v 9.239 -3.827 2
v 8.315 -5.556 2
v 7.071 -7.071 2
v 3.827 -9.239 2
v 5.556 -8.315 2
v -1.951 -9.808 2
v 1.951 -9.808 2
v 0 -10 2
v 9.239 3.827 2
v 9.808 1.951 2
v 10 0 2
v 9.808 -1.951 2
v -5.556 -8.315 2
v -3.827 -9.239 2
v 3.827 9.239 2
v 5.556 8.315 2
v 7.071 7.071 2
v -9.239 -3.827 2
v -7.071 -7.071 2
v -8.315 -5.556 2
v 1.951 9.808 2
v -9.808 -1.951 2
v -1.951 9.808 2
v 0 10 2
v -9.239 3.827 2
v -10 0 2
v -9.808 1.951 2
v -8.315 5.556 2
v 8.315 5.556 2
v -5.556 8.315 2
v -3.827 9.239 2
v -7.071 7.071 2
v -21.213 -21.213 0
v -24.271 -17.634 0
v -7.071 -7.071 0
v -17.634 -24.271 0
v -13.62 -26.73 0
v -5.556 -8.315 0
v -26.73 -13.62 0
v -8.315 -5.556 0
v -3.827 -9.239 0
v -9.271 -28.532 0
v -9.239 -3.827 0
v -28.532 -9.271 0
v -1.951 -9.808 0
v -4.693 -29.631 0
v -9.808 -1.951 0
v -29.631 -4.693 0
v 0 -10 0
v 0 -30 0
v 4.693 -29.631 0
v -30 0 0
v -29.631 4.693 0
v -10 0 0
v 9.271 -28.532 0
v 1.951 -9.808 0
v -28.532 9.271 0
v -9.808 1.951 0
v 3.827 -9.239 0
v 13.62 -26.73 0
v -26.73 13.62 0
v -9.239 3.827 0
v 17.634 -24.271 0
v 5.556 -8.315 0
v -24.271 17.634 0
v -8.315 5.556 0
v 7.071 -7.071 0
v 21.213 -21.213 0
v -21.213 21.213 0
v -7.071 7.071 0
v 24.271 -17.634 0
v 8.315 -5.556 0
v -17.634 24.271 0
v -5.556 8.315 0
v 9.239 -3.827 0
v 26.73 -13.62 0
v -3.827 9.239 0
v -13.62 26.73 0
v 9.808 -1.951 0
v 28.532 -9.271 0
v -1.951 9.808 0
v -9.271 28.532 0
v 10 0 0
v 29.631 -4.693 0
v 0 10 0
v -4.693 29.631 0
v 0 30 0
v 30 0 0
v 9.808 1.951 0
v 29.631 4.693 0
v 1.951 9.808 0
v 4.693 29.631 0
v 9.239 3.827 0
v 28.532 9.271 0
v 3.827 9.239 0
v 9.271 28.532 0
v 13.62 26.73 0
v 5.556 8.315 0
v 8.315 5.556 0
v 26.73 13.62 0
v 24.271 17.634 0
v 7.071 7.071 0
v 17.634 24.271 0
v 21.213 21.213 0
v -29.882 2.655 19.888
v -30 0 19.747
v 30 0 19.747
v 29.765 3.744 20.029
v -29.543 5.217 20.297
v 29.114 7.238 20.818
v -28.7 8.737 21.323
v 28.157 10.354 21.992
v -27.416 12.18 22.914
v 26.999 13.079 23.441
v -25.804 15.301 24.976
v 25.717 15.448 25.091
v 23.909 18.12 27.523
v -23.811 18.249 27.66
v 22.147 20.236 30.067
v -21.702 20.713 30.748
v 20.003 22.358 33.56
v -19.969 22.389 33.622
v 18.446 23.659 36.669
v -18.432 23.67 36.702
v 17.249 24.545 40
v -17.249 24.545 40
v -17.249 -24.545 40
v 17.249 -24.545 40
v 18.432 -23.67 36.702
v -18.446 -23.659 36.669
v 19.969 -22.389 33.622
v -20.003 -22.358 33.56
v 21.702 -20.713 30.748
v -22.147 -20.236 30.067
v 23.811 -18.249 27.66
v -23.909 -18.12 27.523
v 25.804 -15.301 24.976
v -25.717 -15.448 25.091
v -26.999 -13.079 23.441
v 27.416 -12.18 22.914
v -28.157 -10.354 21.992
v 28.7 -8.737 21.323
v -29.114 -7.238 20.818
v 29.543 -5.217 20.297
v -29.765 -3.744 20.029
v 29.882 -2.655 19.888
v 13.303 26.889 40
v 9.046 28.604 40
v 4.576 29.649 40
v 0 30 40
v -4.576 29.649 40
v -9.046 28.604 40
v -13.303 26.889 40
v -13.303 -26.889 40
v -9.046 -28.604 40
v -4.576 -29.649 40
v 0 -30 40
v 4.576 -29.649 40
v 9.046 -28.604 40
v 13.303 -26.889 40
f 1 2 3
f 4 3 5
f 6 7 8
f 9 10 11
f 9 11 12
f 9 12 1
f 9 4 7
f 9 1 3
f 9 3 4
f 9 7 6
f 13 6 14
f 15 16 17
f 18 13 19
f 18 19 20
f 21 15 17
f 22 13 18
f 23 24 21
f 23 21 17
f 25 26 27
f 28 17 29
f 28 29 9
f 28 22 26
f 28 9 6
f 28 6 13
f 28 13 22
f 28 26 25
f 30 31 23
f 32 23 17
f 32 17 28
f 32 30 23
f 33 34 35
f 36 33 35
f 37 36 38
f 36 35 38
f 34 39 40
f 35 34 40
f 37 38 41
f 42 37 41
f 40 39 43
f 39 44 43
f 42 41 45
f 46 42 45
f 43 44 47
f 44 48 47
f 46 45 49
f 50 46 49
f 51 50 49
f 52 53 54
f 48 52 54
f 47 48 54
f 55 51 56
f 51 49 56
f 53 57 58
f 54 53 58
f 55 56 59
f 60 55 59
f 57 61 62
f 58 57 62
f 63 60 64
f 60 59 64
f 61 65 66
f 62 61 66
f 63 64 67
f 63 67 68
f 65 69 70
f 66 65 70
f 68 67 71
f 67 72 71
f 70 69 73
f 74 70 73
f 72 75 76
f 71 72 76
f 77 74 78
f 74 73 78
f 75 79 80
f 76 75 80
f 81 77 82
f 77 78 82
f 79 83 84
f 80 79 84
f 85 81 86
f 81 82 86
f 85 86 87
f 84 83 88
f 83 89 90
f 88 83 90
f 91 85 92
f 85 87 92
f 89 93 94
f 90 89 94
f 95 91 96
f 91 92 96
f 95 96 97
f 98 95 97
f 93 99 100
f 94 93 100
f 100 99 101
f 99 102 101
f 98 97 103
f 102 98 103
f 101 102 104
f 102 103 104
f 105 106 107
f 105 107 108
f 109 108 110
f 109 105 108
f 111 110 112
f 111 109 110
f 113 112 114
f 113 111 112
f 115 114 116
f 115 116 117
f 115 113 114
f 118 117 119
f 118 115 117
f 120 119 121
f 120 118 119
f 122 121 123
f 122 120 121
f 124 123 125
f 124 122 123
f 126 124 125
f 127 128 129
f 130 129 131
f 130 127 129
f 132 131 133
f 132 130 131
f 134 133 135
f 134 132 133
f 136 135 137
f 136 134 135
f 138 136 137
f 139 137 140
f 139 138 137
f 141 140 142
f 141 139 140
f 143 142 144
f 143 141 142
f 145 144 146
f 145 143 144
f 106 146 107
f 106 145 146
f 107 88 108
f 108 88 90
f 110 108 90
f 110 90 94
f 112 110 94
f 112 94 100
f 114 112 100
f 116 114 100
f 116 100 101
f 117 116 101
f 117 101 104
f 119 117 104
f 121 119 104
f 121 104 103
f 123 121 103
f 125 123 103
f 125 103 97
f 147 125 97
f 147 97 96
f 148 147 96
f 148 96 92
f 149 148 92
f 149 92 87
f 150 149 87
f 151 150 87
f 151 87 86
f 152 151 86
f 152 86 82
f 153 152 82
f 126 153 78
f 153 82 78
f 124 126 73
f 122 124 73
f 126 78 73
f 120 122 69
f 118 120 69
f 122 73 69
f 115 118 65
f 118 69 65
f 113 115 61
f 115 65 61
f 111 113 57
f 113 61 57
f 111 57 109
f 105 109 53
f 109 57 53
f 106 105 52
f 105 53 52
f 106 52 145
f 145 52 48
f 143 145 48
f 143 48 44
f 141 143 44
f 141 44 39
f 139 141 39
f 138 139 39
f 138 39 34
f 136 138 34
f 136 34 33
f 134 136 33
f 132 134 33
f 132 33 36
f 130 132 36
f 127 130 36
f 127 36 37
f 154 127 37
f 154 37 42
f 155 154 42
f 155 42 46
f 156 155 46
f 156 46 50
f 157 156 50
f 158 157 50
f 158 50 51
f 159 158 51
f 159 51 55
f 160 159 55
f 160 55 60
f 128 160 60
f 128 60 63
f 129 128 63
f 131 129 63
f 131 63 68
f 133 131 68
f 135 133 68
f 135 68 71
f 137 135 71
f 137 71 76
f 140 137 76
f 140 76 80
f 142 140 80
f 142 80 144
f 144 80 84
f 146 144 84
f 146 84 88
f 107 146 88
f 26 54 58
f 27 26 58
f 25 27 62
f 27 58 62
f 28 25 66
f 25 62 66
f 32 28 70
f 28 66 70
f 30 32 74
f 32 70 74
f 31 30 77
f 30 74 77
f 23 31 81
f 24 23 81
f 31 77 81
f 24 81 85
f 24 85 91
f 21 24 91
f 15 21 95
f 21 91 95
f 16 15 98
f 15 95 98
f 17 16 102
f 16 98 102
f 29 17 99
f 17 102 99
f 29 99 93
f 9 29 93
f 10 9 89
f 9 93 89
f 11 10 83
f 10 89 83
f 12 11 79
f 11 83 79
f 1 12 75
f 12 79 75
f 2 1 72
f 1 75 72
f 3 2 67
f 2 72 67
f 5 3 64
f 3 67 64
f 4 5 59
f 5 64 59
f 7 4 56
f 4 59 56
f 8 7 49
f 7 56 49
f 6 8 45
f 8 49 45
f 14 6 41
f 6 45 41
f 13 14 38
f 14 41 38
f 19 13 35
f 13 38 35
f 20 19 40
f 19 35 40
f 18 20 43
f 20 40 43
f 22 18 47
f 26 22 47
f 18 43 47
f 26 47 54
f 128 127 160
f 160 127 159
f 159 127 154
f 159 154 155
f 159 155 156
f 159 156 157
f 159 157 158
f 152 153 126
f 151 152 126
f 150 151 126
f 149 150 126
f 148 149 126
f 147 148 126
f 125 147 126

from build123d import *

# Parameters (mm, degrees)
SZKIC1_R                        = 30
DODANIE_WYCI_GNI_CIE1_DEPTH     = 40
WYTNIJ_WYCI_GNI_CIE1_DEPTH      = 59.309518948
WYTNIJ_WYCI_GNI_CIE1_DEPTH_BACK = 59.309518948
SZKIC4_R                        = 10
WYTNIJ_WYCI_GNI_CIE2_DEPTH      = 2


with BuildPart() as part:
    # Szkic1 → Dodanie-wyciągnięcie1 (new body)
    with BuildSketch(Plane.XY):
        Circle(SZKIC1_R)
    extrude(amount=DODANIE_WYCI_GNI_CIE1_DEPTH)

    # Szkic2 → Wytnij-wyciągnięcie1 (cut, two sides: drawn at the far end of the back side and taken through both)
    with BuildSketch(Plane(origin=(0, 0, 0), x_dir=(0, 0, -1), z_dir=(1, 0, 0)).offset(-WYTNIJ_WYCI_GNI_CIE1_DEPTH_BACK)):
        with BuildLine():
            ThreePointArc((-19.746856725, 0), (-25.463814718, 15.911137324), (-40, 24.545210352))
            Line((-40, 24.545210352), (-40, -24.545210352))
            ThreePointArc((-40, -24.545210352), (-25.463814718, -15.911137324), (-19.746856725, 0))
        make_face()
        with BuildLine():
            Line((-40, -24.545210352), (-40, 24.545210352))
            ThreePointArc((-40, 24.545210352), (-69.746856725, 0), (-40, -24.545210352))
        make_face()
    extrude(amount=WYTNIJ_WYCI_GNI_CIE1_DEPTH + WYTNIJ_WYCI_GNI_CIE1_DEPTH_BACK, mode=Mode.SUBTRACT)

    # Szkic4 → Wytnij-wyciągnięcie2 (cut)
    with BuildSketch(Plane(origin=(0, 0, 0), x_dir=(-1, 0, 0), z_dir=(0, 0, -1))):
        Circle(SZKIC4_R)
    extrude(amount=-WYTNIJ_WYCI_GNI_CIE2_DEPTH, mode=Mode.SUBTRACT)


solid = part.part
